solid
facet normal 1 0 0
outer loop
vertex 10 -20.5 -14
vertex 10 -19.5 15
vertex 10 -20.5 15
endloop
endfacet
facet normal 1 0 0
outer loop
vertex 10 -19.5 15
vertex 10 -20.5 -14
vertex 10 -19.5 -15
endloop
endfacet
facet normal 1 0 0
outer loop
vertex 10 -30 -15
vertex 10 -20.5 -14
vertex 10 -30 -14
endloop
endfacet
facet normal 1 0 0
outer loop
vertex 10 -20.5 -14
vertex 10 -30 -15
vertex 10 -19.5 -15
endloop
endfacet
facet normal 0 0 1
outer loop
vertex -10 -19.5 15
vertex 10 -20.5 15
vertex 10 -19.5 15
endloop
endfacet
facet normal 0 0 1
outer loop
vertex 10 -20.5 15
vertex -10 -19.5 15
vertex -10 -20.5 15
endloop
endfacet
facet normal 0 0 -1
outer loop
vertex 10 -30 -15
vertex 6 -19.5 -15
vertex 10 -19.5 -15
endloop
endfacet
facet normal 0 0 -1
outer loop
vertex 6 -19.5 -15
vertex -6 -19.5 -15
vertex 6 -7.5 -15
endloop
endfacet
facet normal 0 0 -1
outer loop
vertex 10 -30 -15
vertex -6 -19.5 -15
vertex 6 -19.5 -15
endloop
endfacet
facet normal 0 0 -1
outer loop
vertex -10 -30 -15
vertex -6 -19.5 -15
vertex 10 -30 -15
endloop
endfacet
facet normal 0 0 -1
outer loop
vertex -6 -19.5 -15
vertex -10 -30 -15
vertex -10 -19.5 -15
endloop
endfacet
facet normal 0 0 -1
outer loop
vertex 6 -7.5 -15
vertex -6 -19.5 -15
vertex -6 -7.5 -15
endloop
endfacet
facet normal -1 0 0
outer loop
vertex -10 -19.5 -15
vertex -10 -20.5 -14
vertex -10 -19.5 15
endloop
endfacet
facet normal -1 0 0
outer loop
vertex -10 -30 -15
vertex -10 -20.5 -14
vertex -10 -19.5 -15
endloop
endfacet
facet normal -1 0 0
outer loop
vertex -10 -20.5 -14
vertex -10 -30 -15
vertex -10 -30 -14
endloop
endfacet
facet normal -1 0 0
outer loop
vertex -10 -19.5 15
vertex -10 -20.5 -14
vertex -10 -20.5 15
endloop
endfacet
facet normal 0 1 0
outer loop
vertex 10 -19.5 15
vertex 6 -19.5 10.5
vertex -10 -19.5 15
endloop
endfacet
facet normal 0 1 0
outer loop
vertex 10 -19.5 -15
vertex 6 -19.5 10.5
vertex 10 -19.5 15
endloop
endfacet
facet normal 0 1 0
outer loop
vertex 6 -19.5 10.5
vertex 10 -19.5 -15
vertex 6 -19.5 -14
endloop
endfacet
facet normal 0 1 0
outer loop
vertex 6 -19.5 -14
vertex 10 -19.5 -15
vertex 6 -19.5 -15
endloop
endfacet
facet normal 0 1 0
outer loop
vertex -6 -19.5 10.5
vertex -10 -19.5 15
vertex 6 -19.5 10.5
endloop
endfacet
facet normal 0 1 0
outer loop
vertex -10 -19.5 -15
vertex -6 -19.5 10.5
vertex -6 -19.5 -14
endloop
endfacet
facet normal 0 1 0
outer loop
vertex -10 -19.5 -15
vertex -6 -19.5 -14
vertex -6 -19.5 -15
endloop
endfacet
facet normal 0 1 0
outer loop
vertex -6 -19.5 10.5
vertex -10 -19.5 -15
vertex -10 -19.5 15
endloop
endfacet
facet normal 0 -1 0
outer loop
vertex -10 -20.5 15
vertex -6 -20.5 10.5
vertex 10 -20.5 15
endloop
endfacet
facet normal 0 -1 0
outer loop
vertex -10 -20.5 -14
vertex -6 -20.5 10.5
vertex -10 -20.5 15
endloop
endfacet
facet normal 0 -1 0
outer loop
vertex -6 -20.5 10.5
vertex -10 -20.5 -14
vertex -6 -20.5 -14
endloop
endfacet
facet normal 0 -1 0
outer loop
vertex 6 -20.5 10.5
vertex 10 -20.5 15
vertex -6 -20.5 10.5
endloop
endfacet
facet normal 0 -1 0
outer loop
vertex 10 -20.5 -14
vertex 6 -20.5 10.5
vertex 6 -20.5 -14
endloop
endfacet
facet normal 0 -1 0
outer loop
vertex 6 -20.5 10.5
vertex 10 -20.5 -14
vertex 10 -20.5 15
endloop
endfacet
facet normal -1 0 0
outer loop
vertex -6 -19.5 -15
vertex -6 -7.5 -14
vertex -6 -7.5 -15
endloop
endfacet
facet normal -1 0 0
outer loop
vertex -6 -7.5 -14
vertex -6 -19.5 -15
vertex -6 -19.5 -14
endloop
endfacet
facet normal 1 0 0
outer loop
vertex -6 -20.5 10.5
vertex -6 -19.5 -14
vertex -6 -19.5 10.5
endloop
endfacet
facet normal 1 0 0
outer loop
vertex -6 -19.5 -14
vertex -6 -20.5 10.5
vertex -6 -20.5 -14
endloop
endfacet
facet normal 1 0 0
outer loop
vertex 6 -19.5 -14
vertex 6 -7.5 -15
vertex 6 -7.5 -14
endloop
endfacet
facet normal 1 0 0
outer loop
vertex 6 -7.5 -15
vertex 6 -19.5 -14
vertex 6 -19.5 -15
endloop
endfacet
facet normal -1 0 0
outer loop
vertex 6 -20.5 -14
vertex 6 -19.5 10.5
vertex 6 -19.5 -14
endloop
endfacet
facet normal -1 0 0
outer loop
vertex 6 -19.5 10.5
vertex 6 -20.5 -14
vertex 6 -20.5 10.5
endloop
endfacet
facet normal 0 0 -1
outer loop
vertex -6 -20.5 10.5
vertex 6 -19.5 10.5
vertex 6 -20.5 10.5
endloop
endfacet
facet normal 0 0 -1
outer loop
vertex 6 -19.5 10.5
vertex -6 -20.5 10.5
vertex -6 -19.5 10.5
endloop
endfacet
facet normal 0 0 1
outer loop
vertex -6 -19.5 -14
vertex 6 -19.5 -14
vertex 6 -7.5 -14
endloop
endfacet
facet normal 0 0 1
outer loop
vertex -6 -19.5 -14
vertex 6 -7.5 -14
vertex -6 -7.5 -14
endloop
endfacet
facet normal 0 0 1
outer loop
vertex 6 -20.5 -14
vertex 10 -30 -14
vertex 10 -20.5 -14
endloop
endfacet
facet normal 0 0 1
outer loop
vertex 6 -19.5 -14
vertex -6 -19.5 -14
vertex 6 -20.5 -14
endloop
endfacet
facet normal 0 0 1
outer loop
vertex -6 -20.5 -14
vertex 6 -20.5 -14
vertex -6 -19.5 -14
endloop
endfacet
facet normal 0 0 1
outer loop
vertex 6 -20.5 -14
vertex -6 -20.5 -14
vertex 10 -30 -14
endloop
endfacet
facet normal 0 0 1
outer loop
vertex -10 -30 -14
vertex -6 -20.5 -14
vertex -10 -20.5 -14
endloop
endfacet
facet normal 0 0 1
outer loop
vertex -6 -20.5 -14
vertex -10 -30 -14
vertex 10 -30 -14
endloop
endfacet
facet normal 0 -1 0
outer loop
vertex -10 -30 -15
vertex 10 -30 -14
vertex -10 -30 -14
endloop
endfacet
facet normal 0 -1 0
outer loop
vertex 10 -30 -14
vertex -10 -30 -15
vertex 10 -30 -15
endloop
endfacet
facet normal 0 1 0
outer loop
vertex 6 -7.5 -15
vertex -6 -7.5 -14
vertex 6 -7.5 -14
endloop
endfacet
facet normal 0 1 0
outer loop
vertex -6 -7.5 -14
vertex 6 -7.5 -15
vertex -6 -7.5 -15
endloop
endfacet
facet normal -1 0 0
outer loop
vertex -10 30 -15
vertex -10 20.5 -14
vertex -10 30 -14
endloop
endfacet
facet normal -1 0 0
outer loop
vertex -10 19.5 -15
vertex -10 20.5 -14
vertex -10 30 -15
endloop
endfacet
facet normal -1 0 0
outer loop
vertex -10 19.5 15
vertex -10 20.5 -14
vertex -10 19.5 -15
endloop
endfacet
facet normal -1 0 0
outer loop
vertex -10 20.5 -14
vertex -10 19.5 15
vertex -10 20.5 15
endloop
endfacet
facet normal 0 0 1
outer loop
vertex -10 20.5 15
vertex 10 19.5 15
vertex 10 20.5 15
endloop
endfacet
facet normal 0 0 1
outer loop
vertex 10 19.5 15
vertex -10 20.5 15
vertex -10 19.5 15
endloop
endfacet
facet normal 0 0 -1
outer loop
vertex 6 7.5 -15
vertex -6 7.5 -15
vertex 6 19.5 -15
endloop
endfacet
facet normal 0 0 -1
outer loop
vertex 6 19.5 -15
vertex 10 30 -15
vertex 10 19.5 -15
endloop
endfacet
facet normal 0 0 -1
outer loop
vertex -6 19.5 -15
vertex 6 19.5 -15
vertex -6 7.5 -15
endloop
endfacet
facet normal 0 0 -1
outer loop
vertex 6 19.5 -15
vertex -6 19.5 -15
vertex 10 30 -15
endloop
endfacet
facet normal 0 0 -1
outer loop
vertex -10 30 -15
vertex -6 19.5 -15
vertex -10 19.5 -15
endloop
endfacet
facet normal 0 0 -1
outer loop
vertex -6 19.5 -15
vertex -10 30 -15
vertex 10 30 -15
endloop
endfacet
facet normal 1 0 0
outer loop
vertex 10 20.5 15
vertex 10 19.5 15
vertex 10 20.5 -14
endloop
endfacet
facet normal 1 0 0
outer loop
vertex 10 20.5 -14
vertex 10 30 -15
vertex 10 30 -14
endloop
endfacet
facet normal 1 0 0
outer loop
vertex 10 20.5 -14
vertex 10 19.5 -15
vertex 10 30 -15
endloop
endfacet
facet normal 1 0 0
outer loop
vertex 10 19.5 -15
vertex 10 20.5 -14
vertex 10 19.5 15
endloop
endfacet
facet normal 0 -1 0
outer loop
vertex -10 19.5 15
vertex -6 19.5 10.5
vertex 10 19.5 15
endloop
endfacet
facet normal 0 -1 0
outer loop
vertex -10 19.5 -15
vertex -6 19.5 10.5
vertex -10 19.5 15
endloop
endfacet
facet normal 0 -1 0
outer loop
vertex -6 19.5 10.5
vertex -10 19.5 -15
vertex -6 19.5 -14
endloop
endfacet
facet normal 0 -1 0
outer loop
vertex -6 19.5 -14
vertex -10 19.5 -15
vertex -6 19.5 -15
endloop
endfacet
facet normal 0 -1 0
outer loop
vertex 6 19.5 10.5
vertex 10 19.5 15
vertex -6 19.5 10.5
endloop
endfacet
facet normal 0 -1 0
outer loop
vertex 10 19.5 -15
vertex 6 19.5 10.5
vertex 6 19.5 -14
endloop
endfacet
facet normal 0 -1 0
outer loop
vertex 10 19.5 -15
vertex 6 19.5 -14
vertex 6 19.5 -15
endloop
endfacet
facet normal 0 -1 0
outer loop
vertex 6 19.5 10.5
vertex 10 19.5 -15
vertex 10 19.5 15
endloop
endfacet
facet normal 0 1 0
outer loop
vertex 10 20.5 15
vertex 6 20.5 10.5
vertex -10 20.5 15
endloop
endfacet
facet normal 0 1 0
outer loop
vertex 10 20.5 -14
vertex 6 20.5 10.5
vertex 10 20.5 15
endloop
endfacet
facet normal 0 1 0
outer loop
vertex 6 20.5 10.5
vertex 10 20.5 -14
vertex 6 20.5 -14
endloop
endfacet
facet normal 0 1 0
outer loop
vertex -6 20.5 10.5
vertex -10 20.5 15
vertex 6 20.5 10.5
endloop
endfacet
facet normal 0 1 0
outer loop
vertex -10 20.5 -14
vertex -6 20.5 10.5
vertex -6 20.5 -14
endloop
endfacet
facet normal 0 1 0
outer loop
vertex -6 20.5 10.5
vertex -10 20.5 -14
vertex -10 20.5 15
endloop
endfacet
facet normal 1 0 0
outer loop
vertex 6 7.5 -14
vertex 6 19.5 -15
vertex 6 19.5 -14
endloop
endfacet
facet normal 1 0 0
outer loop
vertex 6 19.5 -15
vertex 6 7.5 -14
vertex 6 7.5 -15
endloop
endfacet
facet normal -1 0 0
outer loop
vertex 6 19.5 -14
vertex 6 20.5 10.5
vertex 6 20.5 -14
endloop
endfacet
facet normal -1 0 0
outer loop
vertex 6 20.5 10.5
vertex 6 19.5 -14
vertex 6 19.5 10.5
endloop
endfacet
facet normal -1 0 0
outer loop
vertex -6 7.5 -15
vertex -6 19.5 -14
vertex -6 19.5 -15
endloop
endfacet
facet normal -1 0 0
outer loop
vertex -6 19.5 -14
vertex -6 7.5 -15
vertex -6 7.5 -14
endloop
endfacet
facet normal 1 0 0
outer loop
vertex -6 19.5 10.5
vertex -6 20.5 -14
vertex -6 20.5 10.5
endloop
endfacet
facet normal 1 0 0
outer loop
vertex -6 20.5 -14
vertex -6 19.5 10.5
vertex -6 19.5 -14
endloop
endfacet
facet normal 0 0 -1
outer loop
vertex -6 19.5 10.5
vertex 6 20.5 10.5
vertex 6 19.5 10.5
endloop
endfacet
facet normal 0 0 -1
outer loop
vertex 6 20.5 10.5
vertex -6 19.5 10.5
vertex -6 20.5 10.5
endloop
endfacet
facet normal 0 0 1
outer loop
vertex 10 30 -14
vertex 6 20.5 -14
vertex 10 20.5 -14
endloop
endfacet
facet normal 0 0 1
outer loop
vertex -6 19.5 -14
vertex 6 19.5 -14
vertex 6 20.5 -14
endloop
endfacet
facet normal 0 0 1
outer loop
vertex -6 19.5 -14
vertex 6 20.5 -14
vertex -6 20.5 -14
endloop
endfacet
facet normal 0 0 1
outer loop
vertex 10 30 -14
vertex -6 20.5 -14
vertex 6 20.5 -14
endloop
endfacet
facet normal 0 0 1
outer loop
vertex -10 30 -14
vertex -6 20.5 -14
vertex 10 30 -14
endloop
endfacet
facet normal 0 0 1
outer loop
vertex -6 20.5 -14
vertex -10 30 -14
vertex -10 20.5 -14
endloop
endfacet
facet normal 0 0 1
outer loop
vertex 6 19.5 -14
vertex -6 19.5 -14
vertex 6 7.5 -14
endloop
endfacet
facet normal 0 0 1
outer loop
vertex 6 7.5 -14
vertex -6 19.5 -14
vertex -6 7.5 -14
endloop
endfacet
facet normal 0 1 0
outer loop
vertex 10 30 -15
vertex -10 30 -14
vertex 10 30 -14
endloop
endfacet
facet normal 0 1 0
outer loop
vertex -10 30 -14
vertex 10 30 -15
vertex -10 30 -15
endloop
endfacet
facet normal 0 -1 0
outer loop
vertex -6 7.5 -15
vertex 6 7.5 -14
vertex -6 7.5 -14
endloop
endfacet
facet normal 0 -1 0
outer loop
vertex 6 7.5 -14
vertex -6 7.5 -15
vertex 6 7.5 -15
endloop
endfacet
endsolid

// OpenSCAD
module bookEnd(x, y, z, mirror)
{ 
		//If we want a mirrored book end, move the bookends around a bunch
		angle = (mirror == true) ? 180 : 0;
		moretranslate = (mirror == true) ? -50 : 0;
		lesstranslate = (mirror == false) ? -20 : 0;

		// Combines all of the shapes and angles them properly
		rotate([0,0,angle]) translate([x, y+moretranslate+lesstranslate, z]) union()
		{
			// Creates the vertical section of the bookend
			difference()
			{
				cube(size = [20, 1, 30], center = true);
				rotate([90,0,0]) translate([0,-2,0]) cube(size = [12, 25, 30], center = true);
			}
			
			// Book-facing end (bottom)
			translate([0,-5,-14.5]) cube(size = [20, 10, 1], center = true);
			// Brace end (bottom)
			translate([0,5,-14.5]) cube(size = [12, 15, 1], center = true);
		}
	
}

// Creates the two book ends
// left bookend
bookEnd(0,0,0,false);
// right bookend
bookEnd(0,30,0,true);
